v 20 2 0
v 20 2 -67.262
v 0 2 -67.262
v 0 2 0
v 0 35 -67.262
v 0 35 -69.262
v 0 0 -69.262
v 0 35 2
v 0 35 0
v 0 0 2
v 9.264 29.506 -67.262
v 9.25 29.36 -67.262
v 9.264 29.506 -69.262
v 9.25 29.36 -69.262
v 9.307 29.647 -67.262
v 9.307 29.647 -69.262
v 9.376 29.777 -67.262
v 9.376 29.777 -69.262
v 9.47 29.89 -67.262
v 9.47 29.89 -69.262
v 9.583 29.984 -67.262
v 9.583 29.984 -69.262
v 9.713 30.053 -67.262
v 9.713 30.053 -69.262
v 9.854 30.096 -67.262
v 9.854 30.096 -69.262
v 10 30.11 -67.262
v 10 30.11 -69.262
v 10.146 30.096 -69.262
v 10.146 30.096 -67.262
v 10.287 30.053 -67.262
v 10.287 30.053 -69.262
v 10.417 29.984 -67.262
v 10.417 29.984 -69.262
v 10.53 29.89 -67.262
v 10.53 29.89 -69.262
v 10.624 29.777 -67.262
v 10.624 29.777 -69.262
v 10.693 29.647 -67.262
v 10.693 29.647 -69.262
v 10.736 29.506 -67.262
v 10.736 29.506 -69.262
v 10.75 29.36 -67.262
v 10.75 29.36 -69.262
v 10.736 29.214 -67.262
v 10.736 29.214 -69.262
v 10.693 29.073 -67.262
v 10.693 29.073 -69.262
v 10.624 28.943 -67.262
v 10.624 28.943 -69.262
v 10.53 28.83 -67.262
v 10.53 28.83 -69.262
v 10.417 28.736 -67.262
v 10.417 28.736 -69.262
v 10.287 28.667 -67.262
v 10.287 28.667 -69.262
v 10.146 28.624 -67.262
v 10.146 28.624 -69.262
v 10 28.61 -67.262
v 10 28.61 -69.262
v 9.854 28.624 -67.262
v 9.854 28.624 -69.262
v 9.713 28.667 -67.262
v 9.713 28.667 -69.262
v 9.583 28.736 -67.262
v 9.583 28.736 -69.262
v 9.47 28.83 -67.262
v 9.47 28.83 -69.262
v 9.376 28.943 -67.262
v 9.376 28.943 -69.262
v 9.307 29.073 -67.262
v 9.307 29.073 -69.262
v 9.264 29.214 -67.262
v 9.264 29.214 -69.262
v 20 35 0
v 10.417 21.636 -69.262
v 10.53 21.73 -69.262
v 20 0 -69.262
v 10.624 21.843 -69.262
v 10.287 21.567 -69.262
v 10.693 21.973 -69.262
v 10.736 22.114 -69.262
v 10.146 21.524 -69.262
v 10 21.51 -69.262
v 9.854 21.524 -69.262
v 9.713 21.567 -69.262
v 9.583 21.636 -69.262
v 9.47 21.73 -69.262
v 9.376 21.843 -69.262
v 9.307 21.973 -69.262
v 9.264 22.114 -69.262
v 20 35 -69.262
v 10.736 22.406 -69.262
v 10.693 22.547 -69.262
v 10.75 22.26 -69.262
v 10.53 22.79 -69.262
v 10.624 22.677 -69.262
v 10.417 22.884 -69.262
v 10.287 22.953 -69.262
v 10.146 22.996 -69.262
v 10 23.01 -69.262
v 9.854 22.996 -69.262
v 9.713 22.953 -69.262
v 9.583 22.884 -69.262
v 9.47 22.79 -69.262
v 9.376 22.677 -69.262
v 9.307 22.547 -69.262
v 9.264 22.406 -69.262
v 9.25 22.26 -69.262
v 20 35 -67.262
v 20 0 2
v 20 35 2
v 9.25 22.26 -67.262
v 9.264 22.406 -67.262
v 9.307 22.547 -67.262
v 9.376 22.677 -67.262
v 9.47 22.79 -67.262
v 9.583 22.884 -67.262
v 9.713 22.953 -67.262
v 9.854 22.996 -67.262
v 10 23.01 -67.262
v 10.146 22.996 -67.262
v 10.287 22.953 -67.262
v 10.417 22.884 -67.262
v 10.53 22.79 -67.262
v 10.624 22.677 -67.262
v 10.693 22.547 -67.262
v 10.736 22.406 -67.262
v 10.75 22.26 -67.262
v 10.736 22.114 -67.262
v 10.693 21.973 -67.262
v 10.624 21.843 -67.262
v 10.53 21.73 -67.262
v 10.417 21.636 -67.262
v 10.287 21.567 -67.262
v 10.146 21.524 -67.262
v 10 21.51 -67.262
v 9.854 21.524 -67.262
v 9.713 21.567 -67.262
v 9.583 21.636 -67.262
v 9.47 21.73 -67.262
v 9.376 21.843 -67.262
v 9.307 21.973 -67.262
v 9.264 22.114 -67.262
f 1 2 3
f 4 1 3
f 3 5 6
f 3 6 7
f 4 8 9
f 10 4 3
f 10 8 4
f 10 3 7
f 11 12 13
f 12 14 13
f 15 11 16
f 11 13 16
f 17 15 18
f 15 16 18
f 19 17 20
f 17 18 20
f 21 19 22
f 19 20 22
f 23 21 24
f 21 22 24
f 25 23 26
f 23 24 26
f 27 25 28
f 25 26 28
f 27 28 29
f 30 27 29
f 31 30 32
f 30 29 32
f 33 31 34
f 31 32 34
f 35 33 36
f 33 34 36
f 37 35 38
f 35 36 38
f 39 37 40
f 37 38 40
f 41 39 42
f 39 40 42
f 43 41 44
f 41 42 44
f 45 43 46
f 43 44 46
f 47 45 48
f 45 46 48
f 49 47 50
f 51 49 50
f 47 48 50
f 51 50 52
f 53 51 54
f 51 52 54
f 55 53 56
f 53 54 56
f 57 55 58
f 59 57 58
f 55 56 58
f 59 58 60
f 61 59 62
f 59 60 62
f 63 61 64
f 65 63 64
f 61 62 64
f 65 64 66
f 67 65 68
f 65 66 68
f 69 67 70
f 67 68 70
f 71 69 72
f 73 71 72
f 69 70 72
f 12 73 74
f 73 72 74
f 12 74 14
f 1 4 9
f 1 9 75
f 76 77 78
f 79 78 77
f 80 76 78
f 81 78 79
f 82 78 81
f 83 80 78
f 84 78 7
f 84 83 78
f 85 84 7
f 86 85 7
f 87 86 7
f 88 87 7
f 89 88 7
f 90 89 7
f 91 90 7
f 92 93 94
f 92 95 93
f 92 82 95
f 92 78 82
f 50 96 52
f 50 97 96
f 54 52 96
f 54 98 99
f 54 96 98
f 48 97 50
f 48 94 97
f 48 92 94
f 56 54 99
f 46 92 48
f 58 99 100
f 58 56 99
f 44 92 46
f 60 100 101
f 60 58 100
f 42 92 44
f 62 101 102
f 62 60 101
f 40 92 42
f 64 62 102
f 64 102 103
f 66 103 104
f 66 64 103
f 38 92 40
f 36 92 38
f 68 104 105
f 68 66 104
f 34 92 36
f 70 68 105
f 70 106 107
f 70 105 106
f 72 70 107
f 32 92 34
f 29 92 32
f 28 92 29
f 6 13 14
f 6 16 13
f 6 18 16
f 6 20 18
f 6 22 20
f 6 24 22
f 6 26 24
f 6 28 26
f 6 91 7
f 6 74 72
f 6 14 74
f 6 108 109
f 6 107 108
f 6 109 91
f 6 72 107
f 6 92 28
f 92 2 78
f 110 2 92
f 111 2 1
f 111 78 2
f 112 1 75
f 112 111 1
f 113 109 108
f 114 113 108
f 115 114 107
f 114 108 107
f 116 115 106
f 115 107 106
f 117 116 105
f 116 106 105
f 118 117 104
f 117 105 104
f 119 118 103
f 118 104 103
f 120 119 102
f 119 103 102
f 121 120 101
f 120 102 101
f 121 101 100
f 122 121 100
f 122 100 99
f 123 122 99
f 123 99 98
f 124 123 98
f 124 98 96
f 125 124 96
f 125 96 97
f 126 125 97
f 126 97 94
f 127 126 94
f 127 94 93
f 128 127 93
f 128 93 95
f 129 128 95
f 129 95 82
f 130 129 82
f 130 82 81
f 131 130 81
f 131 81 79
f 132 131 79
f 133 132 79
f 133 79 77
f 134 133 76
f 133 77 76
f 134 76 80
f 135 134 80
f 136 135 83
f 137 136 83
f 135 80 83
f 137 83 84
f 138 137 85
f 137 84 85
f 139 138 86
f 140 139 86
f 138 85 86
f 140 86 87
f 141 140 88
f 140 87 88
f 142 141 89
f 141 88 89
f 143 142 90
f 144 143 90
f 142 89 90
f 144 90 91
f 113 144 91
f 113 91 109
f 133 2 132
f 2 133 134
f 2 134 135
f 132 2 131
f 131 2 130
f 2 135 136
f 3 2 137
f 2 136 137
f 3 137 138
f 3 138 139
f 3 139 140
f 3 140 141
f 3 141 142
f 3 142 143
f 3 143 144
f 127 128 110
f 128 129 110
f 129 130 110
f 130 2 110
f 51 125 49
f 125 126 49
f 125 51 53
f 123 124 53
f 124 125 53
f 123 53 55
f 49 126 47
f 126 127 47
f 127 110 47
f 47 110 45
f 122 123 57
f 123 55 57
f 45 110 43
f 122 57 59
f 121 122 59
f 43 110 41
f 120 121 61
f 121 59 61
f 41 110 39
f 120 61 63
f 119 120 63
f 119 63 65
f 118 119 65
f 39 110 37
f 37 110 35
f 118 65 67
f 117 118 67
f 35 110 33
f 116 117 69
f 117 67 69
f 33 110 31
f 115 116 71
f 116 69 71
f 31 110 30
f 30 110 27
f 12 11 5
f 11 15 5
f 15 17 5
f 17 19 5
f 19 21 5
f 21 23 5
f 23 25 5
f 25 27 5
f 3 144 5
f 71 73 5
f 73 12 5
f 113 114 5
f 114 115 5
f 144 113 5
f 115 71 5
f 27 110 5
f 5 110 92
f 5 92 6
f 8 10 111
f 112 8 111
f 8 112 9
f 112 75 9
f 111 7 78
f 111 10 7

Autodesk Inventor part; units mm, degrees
ref_plane "YZ Plane" through (0, 0, 0) normal (1, 0, 0) x (0, 1, 0)
ref_plane "XZ Plane" through (0, 0, 0) normal (0, 1, 0) x (-1, 0, 0)
ref_plane "XY Plane" through (0, 0, 0) normal (0, 0, 1) x (1, 0, 0)
sketch "Sketch1" plane through (0, 0, 0) normal (0, 1, 0) x (-1, 0, 0)
  line L0 (0, 0) -> (-20, 0)
  line L1 (-20, 0) -> (-20, -67.262)
  line L2 (-20, -67.262) -> (0, -67.262)
  line L3 (0, -67.262) -> (0, 0)
  dimension "d0" = 20
  dimension "d1" = 67.262
extrude "Extrusion1" add sketch "Sketch1" along normal blind 2
sketch "Sketch2" plane through (0, 0, 0) normal (0, 0, 1) x (1, 0, 0)
  line L0 (0, 0) -> (20, 0)
  line L1 (20, 0) -> (20, 35)
  line L2 (20, 35) -> (0, 35)
  line L3 (0, 35) -> (0, 0)
  dimension "d4" = 20
  dimension "d5" = 35
extrude "Extrusion2" add sketch "Sketch2" along normal blind 2
sketch "Sketch4" plane through (20, 0, -67.262) normal (0, 0, -1) x (-1, 0, 0)
  line L0 (0, 35) -> (20, 35) projected
  line L1 (0, 35) -> (20, 35)
  line L2 (20, 35) -> (20, 0)
  line L3 (20, 0) -> (0, 0)
  line L4 (0, 0) -> (0, 35)
extrude "Extrusion3" add sketch "Sketch4" along normal blind 2
sketch "Sketch5" plane through (20, 0, -69.262) normal (0, 0, -1) x (-1, 0, 0)
  circle A0 centre (10, 29.36) radius 0.75
  line L0 (20, 35) -> (0, 35) projected
  line L1 (0, 35) -> (0, 0) projected
  point P0 (20, 0)
  dimension "d10" = 1.5
  dimension "d11" = 5.64
  dimension "d12" = 10
extrude "Extrusion4" cut sketch "Sketch5" against normal blind 2
sketch "Sketch6" plane through (20, 0, -69.262) normal (0, 0, -1) x (-1, 0, 0)
  circle A0 centre (10, 22.26) radius 0.75
  line L0 (0, 35) -> (0, 0) projected
  circle A1 centre (10, 29.36) radius 0.75 projected
  point P0 (20, 0)
  dimension "d15" = 1.5
  dimension "d16" = 10
  dimension "d17" = 7.1
extrude "Extrusion5" cut sketch "Sketch6" against normal blind 2 contours A0
properties part number "Leg Servo Holder"
